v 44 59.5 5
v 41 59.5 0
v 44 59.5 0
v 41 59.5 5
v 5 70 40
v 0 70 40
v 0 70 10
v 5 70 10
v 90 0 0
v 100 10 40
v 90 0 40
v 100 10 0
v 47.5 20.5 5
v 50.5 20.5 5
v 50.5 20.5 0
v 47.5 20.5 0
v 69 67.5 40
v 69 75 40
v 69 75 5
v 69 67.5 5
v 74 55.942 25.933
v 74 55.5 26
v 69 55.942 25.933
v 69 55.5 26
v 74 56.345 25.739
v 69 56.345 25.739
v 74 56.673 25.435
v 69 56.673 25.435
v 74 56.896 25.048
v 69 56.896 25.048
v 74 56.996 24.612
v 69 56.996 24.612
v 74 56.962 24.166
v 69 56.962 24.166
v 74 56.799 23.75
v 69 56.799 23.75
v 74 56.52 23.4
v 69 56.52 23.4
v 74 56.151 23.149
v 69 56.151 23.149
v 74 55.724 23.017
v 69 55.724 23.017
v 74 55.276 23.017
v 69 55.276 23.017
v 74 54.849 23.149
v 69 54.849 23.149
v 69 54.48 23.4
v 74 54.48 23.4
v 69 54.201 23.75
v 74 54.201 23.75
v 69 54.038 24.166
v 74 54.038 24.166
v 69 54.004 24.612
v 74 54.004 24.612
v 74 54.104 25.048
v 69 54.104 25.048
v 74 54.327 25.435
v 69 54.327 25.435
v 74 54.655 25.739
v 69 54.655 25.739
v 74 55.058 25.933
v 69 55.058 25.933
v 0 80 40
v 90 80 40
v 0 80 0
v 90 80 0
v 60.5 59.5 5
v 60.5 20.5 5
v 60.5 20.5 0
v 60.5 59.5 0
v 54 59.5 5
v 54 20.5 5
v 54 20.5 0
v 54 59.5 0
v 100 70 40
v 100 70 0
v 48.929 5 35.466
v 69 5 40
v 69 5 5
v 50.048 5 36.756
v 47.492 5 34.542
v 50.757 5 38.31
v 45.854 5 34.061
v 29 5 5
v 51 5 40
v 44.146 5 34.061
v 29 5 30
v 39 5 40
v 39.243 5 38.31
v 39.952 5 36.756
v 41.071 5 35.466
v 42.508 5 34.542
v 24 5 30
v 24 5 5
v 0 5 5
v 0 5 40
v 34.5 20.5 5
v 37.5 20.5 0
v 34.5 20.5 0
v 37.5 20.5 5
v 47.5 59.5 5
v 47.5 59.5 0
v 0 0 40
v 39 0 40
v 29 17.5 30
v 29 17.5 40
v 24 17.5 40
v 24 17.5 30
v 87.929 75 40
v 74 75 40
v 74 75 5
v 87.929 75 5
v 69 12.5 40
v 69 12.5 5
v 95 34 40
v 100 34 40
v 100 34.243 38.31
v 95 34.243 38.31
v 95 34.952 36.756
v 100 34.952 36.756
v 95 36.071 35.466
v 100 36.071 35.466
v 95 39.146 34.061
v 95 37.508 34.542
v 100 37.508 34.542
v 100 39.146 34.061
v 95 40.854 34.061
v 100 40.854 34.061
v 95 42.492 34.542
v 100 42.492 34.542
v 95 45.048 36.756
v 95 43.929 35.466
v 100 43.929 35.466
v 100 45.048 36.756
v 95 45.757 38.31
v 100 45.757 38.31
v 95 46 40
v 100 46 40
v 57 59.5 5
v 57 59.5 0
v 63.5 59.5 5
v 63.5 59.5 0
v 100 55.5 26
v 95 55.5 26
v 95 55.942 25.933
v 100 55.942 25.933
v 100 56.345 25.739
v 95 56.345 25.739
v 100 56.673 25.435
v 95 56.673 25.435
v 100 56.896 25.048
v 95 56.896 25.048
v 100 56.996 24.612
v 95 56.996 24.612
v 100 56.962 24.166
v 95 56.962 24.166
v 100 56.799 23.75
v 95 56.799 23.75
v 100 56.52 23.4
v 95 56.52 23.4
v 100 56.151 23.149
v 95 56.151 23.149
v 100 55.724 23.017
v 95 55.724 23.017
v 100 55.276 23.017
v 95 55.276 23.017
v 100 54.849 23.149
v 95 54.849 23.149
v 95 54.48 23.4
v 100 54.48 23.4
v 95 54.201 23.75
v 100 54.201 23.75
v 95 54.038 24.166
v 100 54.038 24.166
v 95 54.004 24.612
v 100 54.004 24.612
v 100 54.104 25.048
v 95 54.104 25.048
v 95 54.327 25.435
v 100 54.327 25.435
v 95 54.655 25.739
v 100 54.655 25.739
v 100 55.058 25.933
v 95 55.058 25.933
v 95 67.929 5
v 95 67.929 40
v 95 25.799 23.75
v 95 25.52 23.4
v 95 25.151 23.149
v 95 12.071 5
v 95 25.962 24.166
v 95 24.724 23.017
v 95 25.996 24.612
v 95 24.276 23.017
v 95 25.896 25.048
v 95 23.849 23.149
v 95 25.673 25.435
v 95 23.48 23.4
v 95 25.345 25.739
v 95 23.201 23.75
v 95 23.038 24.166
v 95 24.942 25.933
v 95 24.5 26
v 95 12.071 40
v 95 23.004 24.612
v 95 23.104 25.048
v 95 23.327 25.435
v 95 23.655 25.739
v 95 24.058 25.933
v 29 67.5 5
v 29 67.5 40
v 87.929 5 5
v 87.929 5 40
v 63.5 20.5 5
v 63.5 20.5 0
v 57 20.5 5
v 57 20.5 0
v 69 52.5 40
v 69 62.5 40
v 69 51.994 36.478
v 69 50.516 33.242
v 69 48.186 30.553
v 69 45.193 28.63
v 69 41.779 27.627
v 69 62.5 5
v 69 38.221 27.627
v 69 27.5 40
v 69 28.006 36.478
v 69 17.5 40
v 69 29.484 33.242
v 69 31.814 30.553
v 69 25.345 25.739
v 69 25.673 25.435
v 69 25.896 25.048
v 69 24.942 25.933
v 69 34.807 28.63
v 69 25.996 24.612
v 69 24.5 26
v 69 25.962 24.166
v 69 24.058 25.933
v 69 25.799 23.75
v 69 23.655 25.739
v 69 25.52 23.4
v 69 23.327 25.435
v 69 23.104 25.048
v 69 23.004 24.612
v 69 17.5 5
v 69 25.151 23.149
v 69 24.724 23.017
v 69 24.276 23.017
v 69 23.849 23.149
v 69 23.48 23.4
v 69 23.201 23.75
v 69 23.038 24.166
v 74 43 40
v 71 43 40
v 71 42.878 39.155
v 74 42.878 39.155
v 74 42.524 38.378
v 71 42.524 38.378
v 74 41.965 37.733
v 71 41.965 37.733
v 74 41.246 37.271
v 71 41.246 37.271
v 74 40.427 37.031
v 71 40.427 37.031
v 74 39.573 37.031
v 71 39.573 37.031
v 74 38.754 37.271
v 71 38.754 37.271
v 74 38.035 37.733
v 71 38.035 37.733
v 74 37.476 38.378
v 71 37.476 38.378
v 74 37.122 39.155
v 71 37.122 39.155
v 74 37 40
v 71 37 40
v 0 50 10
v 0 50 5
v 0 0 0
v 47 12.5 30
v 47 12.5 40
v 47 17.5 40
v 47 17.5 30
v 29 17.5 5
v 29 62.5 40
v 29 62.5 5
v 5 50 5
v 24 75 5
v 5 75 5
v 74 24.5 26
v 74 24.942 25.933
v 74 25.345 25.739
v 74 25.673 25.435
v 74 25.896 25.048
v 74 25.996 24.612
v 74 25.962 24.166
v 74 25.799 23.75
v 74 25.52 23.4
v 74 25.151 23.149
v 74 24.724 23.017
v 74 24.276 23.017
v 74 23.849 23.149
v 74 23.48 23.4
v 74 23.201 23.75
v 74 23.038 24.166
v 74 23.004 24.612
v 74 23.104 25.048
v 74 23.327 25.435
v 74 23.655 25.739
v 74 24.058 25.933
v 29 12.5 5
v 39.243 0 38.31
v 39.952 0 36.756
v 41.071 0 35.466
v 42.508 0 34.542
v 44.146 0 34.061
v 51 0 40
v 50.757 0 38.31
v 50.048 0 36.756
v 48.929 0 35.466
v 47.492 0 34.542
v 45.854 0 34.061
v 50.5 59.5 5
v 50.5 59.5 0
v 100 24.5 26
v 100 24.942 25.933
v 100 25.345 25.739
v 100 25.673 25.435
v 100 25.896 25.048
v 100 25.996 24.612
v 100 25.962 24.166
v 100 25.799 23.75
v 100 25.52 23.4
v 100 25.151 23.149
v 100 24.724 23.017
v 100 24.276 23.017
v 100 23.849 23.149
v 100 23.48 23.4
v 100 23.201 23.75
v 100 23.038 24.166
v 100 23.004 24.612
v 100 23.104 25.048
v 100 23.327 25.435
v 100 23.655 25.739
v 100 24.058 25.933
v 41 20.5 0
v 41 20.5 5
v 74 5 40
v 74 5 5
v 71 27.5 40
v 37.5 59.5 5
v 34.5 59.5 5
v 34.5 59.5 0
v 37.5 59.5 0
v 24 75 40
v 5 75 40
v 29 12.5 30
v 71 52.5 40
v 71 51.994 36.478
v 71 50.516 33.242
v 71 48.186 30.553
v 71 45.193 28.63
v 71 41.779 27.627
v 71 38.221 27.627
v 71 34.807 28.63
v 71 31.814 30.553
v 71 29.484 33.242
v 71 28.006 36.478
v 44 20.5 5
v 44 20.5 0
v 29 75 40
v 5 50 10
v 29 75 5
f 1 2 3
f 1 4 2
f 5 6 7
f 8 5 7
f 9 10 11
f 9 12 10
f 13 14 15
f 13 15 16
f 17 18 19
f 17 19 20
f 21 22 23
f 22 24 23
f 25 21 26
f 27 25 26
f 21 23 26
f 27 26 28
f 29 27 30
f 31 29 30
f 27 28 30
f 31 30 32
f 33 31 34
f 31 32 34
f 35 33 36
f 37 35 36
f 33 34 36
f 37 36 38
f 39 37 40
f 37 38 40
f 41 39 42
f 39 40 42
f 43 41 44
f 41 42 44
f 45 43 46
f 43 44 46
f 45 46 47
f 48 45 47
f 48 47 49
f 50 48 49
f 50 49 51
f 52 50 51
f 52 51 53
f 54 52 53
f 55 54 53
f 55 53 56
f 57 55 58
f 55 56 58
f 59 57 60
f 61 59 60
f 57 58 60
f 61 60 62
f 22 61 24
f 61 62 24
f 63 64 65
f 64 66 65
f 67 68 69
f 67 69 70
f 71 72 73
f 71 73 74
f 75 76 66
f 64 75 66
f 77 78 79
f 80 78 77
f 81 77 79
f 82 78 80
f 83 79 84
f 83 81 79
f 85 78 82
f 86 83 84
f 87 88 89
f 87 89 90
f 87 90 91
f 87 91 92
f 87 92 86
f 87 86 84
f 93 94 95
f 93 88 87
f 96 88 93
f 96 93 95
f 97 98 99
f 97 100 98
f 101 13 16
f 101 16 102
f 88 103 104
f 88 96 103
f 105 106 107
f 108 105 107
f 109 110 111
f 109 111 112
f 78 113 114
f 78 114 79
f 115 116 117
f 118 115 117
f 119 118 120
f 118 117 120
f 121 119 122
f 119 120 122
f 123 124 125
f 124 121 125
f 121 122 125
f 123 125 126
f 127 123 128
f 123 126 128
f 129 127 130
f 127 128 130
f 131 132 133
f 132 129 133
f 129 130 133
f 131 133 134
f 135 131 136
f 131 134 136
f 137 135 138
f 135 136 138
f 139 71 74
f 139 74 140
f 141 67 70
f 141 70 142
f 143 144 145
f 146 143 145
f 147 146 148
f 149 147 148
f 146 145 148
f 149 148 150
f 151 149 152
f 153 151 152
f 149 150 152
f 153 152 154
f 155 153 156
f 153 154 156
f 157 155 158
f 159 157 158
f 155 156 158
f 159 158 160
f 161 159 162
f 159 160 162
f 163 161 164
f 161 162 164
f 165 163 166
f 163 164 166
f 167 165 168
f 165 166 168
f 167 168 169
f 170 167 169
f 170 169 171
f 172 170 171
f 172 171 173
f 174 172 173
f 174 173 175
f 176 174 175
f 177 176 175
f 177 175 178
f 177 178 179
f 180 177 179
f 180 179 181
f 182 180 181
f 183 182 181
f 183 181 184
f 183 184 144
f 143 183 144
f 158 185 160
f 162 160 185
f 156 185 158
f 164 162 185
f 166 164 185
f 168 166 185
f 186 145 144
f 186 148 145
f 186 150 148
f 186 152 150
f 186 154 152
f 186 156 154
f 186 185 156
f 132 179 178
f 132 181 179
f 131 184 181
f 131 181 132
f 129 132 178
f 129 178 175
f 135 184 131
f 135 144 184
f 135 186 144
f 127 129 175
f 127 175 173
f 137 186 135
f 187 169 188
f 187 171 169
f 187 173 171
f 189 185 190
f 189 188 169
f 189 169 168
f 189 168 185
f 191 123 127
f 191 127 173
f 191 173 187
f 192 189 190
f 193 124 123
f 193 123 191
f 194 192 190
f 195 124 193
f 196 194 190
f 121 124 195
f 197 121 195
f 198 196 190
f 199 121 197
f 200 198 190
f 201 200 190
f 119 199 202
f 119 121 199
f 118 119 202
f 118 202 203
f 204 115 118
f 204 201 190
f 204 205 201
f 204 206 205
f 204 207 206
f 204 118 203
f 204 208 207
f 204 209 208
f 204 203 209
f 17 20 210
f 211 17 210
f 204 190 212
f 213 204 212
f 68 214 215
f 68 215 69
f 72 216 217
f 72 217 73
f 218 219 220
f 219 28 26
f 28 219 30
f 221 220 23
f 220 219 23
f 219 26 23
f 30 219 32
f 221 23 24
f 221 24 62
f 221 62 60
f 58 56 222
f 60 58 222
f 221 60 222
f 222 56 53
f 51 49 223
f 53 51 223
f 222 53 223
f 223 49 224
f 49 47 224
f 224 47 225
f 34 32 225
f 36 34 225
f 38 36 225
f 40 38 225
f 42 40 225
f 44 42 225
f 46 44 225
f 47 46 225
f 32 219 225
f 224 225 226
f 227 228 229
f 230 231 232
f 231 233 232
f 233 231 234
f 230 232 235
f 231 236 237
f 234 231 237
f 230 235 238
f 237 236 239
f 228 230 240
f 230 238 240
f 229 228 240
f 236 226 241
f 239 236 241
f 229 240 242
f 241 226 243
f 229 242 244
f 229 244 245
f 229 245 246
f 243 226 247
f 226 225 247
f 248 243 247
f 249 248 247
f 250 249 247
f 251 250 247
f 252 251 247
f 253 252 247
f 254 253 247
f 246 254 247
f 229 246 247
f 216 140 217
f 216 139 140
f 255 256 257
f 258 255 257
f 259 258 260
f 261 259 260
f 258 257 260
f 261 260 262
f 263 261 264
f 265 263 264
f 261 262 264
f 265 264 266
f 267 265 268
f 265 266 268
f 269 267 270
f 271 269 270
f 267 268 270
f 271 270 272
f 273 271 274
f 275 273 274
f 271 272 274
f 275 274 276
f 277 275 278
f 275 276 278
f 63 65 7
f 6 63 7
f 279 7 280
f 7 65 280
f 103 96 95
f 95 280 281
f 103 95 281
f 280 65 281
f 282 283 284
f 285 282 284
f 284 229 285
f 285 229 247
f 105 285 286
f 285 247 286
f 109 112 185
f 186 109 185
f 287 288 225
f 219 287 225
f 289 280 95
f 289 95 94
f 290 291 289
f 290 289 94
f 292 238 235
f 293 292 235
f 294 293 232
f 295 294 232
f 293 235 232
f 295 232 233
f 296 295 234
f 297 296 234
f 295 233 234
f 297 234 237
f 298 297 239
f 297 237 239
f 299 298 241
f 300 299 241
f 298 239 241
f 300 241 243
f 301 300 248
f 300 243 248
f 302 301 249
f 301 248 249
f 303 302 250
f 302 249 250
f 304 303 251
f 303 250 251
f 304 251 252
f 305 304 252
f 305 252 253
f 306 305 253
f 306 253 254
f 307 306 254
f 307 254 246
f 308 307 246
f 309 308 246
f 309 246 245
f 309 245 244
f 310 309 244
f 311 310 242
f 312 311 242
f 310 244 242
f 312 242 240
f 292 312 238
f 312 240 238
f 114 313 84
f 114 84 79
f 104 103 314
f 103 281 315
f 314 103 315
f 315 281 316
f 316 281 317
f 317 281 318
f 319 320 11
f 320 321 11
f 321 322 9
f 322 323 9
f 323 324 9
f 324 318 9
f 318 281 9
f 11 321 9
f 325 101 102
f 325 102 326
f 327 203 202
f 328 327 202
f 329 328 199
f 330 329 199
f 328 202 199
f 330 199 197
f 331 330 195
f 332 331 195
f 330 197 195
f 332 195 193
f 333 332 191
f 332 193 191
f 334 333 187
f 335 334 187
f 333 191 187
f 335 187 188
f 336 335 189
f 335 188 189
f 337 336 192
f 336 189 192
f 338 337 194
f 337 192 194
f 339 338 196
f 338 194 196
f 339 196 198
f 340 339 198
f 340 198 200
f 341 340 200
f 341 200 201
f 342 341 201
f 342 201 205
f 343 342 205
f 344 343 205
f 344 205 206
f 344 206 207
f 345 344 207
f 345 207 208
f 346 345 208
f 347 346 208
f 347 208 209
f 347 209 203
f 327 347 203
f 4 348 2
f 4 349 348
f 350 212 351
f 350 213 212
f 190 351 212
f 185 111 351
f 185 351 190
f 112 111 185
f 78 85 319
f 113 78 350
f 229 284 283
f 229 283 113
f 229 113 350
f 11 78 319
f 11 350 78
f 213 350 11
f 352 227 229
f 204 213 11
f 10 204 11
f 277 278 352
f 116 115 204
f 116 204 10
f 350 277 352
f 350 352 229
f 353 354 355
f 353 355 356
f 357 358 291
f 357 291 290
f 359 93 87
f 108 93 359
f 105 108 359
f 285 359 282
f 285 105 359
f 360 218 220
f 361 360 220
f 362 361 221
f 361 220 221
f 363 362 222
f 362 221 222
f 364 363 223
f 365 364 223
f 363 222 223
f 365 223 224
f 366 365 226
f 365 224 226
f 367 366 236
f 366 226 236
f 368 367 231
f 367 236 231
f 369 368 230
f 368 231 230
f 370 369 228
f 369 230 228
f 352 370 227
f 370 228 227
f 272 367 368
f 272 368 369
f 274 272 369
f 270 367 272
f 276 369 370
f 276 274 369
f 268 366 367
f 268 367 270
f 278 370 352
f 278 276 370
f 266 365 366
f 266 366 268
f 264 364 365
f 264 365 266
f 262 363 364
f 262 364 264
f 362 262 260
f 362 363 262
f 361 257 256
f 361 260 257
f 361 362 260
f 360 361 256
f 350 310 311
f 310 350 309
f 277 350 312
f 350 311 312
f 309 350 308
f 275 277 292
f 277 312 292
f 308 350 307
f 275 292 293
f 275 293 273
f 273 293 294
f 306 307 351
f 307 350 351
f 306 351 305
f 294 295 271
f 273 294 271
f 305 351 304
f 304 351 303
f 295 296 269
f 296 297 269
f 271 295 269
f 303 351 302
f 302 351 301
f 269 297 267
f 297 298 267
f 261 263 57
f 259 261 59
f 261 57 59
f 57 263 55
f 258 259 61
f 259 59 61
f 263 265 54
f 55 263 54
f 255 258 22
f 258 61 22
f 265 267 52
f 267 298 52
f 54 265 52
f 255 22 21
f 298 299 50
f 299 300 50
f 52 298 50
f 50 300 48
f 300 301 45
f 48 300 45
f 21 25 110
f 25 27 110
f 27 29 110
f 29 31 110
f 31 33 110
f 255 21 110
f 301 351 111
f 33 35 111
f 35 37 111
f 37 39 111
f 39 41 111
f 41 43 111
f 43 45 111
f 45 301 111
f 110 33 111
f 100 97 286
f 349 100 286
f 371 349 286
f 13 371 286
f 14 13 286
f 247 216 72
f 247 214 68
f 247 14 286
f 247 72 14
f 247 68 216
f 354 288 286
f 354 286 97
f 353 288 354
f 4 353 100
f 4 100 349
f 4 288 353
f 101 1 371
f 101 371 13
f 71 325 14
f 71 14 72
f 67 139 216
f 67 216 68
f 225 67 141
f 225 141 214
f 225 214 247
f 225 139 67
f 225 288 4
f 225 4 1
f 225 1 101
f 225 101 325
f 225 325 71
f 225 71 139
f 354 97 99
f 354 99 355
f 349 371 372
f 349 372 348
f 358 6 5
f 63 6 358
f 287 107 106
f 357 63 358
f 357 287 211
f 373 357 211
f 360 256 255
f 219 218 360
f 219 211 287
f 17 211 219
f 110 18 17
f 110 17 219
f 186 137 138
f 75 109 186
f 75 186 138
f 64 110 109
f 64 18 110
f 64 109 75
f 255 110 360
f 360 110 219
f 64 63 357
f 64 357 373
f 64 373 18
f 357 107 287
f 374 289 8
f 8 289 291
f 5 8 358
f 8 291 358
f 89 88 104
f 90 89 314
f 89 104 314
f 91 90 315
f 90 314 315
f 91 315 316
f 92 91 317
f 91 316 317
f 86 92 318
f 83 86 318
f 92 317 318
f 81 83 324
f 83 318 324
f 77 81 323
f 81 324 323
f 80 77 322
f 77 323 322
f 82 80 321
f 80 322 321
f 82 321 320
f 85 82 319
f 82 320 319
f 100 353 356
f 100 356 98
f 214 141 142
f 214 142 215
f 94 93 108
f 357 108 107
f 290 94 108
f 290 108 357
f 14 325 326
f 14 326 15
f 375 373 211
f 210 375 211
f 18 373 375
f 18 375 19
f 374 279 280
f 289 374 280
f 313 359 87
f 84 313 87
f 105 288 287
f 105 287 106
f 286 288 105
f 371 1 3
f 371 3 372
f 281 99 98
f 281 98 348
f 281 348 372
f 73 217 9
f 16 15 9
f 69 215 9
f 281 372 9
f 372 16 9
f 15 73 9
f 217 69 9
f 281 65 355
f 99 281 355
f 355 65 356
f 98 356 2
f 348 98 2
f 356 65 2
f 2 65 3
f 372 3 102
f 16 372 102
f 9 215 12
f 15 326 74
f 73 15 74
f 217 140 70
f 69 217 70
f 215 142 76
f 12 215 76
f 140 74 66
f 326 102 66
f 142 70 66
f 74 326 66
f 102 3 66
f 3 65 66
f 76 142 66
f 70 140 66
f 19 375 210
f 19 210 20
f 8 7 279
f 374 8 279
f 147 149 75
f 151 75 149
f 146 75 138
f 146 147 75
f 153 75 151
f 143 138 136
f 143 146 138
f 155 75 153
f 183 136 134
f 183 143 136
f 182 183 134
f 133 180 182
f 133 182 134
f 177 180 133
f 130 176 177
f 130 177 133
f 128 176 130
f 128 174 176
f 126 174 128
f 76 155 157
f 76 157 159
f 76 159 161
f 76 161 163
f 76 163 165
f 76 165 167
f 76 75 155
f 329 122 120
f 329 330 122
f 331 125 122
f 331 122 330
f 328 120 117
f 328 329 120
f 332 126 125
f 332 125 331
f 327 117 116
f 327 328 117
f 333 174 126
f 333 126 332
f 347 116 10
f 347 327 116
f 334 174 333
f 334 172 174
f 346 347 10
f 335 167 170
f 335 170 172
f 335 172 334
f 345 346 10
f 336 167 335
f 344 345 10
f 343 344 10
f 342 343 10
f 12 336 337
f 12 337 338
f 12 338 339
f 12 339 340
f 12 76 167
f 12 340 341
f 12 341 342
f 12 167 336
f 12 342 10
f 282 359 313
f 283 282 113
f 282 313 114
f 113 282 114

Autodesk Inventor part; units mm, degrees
ref_plane "YZ Plane" through (0, 0, 0) normal (1, 0, 0) x (0, 1, 0)
ref_plane "XZ Plane" through (0, 0, 0) normal (0, 1, 0) x (-1, 0, 0)
ref_plane "XY Plane" through (0, 0, 0) normal (0, 0, 1) x (1, 0, 0)
sketch "Sketch1" plane through (0, 0, 0) normal (0, 0, 1) x (1, 0, 0)
  line L0 (0, 0) -> (100, 0)
  line L1 (100, 0) -> (100, 80) construction
  line L2 (100, 80) -> (0, 80)
  line L3 (0, 80) -> (0, 0)
  line L4 (100, 70) -> (90, 80)
  line L5 (100, 10) -> (90, 0)
  line L6 (100, 70) -> (100, 10)
  line L7 (90, 0) -> (0, 0)
  line L8 (90, 80) -> (0, 80)
  dimension "d0" = 100
  dimension "d1" = 80
  dimension "d15" = 10
  dimension "d16" = 10
  dimension "d17" = 10
  dimension "d18" = 10
extrude "Extrusion1" add sketch "Sketch1" along normal blind 40
sketch "Sketch2" plane through (0, 0, 40) normal (0, 0, 1) x (1, 0, 0)
  line L0 (90, 80) -> (0, 80) projected
  line L1 (100, 70) -> (90, 80) projected
  line L2 (100, 10) -> (100, 70) projected
  line L3 (90, 0) -> (100, 10) projected
  line L4 (0, 0) -> (90, 0) projected
  line L5 (0, 75) -> (87.9289, 75)
  line L6 (87.9289, 75) -> (95, 67.9289)
  line L7 (95, 67.9289) -> (95, 12.0711)
  line L8 (95, 12.0711) -> (87.9289, 5)
  line L9 (87.9289, 5) -> (0, 5)
  line L10 (0, 80) -> (0, 0) projected
  line L11 (0, 75) -> (0, 5)
  dimension "d19" = 5
extrude "Extrusion2" cut sketch "Sketch2" against normal blind 35 contours L5 L6 L7 L8 L9 L10
sketch "Sketch3" plane through (0, 0, 0) normal (-1, 0, 0) x (0, 0, 1)
  line L0 (0, 80) -> (40, 80)
  line L1 (0, 0) -> (40, 0)
  line L2 (0, 80) -> (10, 80)
  line L3 (10, 80) -> (10, 50)
  line L4 (10, 50) -> (0, 50)
  line L5 (0, 50) -> (0, 80)
  line L6 (40, 80) -> (40, 0)
  line L7 (0, 80) -> (40, 80)
  line L8 (40, 80) -> (40, 70)
  line L9 (40, 70) -> (0, 70)
  line L10 (0, 70) -> (0, 80)
  line L11 (0, 0) -> (40, 0) projected
  line L12 (0, 80) -> (40, 80) projected
  point P0 (20, 0)
  point P1 (20, 80)
  dimension "d7" = 10
  dimension "d8" = 10
  dimension "d11" = 50
extrude "Extrusion3" add sketch "Sketch3" against normal blind 5
sketch "Sketch4" plane through (100, 10, 0) normal (1, 0, 0) x (0, 0, -1)
  circle A0 centre (-40, 30) radius 6
  line L0 (-40, 0) -> (-40, 60) projected
  point P0 (0, 0)
  dimension "d12" = 12
extrude "Extrusion4" cut sketch "Sketch4" against normal through all
sketch "Sketch5" plane through (0, 0, 5) normal (0, 0, 1) x (1, 0, 0)
  line L0 (74, 75) -> (69, 75)
  line L1 (69, 75) -> (69, 5)
  line L2 (69, 5) -> (74, 5)
  line L3 (74, 5) -> (74, 75)
  line L4 (87.9289, 5) -> (0, 5) projected
  line L5 (5, 75) -> (87.9289, 75) projected
  line L6 (95, 67.9289) -> (95, 46) projected
  point P0 (0, 0)
  dimension "d20" = 5
  dimension "d21" = 21
extrude "Extrusion5" add sketch "Sketch5" along normal blind 35
sketch "Sketch6" plane through (69, 5, 5) normal (-1, 0, 0) x (0, 0, 1)
  line L0 (35, 70) -> (35, 0) projected
  circle A0 centre (35, 35) radius 3
  line L1 (19.5, 19.5) -> (50.5, 19.5) construction
  line L2 (50.5, 19.5) -> (50.5, 50.5) construction
  line L3 (50.5, 50.5) -> (19.5, 50.5) construction
  line L4 (19.5, 50.5) -> (19.5, 19.5) construction
  line L5 (19.5, 19.5) -> (50.5, 50.5) construction
  line L6 (50.5, 19.5) -> (19.5, 50.5) construction
  circle A1 centre (19.5, 50.5) radius 1.5
  circle A2 centre (19.5, 19.5) radius 1.5
  point P0 (-5, -5)
  dimension "d24" = 6
  dimension "d25" = 31
  dimension "d26" = 31
  dimension "d27" = 3
  dimension "d28" = 3
extrude "Extrusion6" cut sketch "Sketch6" against normal through all
sketch "Sketch7" plane through (69, 5, 5) normal (-1, 0, 0) x (0, 0, 1)
  arc A0 (35, 38) -> (35, 32) centre (35, 35) ccw projected
  circle A1 centre (35, 35) radius 12.5
  point P0 (-5, -5)
  dimension "d31" = 25
extrude "Extrusion7" cut sketch "Sketch7" against normal blind 2
sketch "Sketch8" plane through (0, 0, 5) normal (0, 0, 1) x (1, 0, 0)
  line L0 (69, 17.5) -> (24, 17.5)
  line L1 (24, 17.5) -> (24, 12.5)
  line L2 (24, 12.5) -> (69, 12.5)
  line L3 (69, 12.5) -> (69, 17.5)
  line L4 (69, 27.5) -> (69, 5) projected
  line L5 (69, 67.5) -> (24, 67.5)
  line L6 (24, 67.5) -> (24, 62.5)
  line L7 (24, 62.5) -> (69, 62.5)
  line L8 (69, 62.5) -> (69, 67.5)
  line L9 (24, 62.5) -> (24, 17.5) construction
  line L10 (69, 27.5) -> (69, 52.5) construction
  point P0 (0, 0)
  point P1 (69, 15)
  point P2 (24, 40)
  point P3 (69, 40)
  dimension "d34" = 45
  dimension "d35" = 5
  dimension "d36" = 45
  dimension "d37" = 5
  dimension "d38" = 45
extrude "Extrusion8" add sketch "Sketch8" along normal blind 35
sketch "Sketch9" plane through (0, 0, 5) normal (0, 0, 1) x (1, 0, 0)
  line L0 (24, 75) -> (29, 75)
  line L1 (29, 75) -> (29, 5)
  line L2 (29, 5) -> (24, 5)
  line L3 (24, 5) -> (24, 75)
  line L4 (5, 75) -> (69, 75) projected
  line L5 (69, 5) -> (0, 5) projected
  point P0 (0, 0)
  point P1 (24, 12.5)
  dimension "d41" = 5
extrude "Extrusion9" add sketch "Sketch9" along normal blind 35
sketch "Sketch10" plane through (0, 0, 40) normal (0, 0, 1) x (1, 0, 0)
  line L0 (29, 17.5) -> (69, 17.5) projected
  line L1 (24, 5) -> (24, 75) projected
  line L2 (47, 17.5) -> (24, 17.5)
  line L3 (24, 17.5) -> (24, 5)
  line L4 (24, 5) -> (47, 5)
  line L5 (47, 5) -> (47, 17.5)
  point P0 (0, 0)
  dimension "d44" = 23
extrude "Extrusion10" cut sketch "Sketch10" against normal blind 10
sketch "Sketch11" plane through (0, 0, 5) normal (0, 0, 1) x (1, 0, 0)
  line L0 (34.5, 59.5) -> (37.5, 59.5)
  line L1 (37.5, 59.5) -> (37.5, 20.5)
  line L2 (37.5, 20.5) -> (34.5, 20.5)
  line L3 (34.5, 20.5) -> (34.5, 59.5)
  line L4 (29, 62.5) -> (69, 62.5) projected
  line L5 (29, 17.5) -> (47, 17.5) projected
  line L6 (29, 17.5) -> (29, 62.5) projected
  line L7 (41, 59.5) -> (44, 59.5)
  line L8 (44, 59.5) -> (44, 20.5)
  line L9 (44, 20.5) -> (41, 20.5)
  line L10 (41, 20.5) -> (41, 59.5)
  line L11 (47.5, 59.5) -> (50.5, 59.5)
  line L12 (50.5, 59.5) -> (50.5, 20.5)
  line L13 (50.5, 20.5) -> (47.5, 20.5)
  line L14 (47.5, 20.5) -> (47.5, 59.5)
  line L15 (54, 59.5) -> (57, 59.5)
  line L16 (57, 59.5) -> (57, 20.5)
  line L17 (57, 20.5) -> (54, 20.5)
  line L18 (54, 20.5) -> (54, 59.5)
  line L19 (60.5, 59.5) -> (63.5, 59.5)
  line L20 (63.5, 59.5) -> (63.5, 20.5)
  line L21 (63.5, 20.5) -> (60.5, 20.5)
  line L22 (60.5, 20.5) -> (60.5, 59.5)
  point P0 (0, 0)
  dimension "d47" = 3
  dimension "d48" = 3
  dimension "d49" = 3
  dimension "d50" = 5.5
  dimension "d53" = 6.5
extrude "Extrusion11" cut sketch "Sketch11" against normal through all
sketch "Sketch12" plane through (0, 0, 0) normal (0, -1, 0) x (1, 0, 0)
  circle A0 centre (45, 40) radius 6
  line L0 (0, 40) -> (90, 40) projected
  point P0 (0, 0)
  dimension "d60" = 12
extrude "Extrusion12" cut sketch "Sketch12" against normal blind 5
properties part number "FA001" material "ABS Plastic"
